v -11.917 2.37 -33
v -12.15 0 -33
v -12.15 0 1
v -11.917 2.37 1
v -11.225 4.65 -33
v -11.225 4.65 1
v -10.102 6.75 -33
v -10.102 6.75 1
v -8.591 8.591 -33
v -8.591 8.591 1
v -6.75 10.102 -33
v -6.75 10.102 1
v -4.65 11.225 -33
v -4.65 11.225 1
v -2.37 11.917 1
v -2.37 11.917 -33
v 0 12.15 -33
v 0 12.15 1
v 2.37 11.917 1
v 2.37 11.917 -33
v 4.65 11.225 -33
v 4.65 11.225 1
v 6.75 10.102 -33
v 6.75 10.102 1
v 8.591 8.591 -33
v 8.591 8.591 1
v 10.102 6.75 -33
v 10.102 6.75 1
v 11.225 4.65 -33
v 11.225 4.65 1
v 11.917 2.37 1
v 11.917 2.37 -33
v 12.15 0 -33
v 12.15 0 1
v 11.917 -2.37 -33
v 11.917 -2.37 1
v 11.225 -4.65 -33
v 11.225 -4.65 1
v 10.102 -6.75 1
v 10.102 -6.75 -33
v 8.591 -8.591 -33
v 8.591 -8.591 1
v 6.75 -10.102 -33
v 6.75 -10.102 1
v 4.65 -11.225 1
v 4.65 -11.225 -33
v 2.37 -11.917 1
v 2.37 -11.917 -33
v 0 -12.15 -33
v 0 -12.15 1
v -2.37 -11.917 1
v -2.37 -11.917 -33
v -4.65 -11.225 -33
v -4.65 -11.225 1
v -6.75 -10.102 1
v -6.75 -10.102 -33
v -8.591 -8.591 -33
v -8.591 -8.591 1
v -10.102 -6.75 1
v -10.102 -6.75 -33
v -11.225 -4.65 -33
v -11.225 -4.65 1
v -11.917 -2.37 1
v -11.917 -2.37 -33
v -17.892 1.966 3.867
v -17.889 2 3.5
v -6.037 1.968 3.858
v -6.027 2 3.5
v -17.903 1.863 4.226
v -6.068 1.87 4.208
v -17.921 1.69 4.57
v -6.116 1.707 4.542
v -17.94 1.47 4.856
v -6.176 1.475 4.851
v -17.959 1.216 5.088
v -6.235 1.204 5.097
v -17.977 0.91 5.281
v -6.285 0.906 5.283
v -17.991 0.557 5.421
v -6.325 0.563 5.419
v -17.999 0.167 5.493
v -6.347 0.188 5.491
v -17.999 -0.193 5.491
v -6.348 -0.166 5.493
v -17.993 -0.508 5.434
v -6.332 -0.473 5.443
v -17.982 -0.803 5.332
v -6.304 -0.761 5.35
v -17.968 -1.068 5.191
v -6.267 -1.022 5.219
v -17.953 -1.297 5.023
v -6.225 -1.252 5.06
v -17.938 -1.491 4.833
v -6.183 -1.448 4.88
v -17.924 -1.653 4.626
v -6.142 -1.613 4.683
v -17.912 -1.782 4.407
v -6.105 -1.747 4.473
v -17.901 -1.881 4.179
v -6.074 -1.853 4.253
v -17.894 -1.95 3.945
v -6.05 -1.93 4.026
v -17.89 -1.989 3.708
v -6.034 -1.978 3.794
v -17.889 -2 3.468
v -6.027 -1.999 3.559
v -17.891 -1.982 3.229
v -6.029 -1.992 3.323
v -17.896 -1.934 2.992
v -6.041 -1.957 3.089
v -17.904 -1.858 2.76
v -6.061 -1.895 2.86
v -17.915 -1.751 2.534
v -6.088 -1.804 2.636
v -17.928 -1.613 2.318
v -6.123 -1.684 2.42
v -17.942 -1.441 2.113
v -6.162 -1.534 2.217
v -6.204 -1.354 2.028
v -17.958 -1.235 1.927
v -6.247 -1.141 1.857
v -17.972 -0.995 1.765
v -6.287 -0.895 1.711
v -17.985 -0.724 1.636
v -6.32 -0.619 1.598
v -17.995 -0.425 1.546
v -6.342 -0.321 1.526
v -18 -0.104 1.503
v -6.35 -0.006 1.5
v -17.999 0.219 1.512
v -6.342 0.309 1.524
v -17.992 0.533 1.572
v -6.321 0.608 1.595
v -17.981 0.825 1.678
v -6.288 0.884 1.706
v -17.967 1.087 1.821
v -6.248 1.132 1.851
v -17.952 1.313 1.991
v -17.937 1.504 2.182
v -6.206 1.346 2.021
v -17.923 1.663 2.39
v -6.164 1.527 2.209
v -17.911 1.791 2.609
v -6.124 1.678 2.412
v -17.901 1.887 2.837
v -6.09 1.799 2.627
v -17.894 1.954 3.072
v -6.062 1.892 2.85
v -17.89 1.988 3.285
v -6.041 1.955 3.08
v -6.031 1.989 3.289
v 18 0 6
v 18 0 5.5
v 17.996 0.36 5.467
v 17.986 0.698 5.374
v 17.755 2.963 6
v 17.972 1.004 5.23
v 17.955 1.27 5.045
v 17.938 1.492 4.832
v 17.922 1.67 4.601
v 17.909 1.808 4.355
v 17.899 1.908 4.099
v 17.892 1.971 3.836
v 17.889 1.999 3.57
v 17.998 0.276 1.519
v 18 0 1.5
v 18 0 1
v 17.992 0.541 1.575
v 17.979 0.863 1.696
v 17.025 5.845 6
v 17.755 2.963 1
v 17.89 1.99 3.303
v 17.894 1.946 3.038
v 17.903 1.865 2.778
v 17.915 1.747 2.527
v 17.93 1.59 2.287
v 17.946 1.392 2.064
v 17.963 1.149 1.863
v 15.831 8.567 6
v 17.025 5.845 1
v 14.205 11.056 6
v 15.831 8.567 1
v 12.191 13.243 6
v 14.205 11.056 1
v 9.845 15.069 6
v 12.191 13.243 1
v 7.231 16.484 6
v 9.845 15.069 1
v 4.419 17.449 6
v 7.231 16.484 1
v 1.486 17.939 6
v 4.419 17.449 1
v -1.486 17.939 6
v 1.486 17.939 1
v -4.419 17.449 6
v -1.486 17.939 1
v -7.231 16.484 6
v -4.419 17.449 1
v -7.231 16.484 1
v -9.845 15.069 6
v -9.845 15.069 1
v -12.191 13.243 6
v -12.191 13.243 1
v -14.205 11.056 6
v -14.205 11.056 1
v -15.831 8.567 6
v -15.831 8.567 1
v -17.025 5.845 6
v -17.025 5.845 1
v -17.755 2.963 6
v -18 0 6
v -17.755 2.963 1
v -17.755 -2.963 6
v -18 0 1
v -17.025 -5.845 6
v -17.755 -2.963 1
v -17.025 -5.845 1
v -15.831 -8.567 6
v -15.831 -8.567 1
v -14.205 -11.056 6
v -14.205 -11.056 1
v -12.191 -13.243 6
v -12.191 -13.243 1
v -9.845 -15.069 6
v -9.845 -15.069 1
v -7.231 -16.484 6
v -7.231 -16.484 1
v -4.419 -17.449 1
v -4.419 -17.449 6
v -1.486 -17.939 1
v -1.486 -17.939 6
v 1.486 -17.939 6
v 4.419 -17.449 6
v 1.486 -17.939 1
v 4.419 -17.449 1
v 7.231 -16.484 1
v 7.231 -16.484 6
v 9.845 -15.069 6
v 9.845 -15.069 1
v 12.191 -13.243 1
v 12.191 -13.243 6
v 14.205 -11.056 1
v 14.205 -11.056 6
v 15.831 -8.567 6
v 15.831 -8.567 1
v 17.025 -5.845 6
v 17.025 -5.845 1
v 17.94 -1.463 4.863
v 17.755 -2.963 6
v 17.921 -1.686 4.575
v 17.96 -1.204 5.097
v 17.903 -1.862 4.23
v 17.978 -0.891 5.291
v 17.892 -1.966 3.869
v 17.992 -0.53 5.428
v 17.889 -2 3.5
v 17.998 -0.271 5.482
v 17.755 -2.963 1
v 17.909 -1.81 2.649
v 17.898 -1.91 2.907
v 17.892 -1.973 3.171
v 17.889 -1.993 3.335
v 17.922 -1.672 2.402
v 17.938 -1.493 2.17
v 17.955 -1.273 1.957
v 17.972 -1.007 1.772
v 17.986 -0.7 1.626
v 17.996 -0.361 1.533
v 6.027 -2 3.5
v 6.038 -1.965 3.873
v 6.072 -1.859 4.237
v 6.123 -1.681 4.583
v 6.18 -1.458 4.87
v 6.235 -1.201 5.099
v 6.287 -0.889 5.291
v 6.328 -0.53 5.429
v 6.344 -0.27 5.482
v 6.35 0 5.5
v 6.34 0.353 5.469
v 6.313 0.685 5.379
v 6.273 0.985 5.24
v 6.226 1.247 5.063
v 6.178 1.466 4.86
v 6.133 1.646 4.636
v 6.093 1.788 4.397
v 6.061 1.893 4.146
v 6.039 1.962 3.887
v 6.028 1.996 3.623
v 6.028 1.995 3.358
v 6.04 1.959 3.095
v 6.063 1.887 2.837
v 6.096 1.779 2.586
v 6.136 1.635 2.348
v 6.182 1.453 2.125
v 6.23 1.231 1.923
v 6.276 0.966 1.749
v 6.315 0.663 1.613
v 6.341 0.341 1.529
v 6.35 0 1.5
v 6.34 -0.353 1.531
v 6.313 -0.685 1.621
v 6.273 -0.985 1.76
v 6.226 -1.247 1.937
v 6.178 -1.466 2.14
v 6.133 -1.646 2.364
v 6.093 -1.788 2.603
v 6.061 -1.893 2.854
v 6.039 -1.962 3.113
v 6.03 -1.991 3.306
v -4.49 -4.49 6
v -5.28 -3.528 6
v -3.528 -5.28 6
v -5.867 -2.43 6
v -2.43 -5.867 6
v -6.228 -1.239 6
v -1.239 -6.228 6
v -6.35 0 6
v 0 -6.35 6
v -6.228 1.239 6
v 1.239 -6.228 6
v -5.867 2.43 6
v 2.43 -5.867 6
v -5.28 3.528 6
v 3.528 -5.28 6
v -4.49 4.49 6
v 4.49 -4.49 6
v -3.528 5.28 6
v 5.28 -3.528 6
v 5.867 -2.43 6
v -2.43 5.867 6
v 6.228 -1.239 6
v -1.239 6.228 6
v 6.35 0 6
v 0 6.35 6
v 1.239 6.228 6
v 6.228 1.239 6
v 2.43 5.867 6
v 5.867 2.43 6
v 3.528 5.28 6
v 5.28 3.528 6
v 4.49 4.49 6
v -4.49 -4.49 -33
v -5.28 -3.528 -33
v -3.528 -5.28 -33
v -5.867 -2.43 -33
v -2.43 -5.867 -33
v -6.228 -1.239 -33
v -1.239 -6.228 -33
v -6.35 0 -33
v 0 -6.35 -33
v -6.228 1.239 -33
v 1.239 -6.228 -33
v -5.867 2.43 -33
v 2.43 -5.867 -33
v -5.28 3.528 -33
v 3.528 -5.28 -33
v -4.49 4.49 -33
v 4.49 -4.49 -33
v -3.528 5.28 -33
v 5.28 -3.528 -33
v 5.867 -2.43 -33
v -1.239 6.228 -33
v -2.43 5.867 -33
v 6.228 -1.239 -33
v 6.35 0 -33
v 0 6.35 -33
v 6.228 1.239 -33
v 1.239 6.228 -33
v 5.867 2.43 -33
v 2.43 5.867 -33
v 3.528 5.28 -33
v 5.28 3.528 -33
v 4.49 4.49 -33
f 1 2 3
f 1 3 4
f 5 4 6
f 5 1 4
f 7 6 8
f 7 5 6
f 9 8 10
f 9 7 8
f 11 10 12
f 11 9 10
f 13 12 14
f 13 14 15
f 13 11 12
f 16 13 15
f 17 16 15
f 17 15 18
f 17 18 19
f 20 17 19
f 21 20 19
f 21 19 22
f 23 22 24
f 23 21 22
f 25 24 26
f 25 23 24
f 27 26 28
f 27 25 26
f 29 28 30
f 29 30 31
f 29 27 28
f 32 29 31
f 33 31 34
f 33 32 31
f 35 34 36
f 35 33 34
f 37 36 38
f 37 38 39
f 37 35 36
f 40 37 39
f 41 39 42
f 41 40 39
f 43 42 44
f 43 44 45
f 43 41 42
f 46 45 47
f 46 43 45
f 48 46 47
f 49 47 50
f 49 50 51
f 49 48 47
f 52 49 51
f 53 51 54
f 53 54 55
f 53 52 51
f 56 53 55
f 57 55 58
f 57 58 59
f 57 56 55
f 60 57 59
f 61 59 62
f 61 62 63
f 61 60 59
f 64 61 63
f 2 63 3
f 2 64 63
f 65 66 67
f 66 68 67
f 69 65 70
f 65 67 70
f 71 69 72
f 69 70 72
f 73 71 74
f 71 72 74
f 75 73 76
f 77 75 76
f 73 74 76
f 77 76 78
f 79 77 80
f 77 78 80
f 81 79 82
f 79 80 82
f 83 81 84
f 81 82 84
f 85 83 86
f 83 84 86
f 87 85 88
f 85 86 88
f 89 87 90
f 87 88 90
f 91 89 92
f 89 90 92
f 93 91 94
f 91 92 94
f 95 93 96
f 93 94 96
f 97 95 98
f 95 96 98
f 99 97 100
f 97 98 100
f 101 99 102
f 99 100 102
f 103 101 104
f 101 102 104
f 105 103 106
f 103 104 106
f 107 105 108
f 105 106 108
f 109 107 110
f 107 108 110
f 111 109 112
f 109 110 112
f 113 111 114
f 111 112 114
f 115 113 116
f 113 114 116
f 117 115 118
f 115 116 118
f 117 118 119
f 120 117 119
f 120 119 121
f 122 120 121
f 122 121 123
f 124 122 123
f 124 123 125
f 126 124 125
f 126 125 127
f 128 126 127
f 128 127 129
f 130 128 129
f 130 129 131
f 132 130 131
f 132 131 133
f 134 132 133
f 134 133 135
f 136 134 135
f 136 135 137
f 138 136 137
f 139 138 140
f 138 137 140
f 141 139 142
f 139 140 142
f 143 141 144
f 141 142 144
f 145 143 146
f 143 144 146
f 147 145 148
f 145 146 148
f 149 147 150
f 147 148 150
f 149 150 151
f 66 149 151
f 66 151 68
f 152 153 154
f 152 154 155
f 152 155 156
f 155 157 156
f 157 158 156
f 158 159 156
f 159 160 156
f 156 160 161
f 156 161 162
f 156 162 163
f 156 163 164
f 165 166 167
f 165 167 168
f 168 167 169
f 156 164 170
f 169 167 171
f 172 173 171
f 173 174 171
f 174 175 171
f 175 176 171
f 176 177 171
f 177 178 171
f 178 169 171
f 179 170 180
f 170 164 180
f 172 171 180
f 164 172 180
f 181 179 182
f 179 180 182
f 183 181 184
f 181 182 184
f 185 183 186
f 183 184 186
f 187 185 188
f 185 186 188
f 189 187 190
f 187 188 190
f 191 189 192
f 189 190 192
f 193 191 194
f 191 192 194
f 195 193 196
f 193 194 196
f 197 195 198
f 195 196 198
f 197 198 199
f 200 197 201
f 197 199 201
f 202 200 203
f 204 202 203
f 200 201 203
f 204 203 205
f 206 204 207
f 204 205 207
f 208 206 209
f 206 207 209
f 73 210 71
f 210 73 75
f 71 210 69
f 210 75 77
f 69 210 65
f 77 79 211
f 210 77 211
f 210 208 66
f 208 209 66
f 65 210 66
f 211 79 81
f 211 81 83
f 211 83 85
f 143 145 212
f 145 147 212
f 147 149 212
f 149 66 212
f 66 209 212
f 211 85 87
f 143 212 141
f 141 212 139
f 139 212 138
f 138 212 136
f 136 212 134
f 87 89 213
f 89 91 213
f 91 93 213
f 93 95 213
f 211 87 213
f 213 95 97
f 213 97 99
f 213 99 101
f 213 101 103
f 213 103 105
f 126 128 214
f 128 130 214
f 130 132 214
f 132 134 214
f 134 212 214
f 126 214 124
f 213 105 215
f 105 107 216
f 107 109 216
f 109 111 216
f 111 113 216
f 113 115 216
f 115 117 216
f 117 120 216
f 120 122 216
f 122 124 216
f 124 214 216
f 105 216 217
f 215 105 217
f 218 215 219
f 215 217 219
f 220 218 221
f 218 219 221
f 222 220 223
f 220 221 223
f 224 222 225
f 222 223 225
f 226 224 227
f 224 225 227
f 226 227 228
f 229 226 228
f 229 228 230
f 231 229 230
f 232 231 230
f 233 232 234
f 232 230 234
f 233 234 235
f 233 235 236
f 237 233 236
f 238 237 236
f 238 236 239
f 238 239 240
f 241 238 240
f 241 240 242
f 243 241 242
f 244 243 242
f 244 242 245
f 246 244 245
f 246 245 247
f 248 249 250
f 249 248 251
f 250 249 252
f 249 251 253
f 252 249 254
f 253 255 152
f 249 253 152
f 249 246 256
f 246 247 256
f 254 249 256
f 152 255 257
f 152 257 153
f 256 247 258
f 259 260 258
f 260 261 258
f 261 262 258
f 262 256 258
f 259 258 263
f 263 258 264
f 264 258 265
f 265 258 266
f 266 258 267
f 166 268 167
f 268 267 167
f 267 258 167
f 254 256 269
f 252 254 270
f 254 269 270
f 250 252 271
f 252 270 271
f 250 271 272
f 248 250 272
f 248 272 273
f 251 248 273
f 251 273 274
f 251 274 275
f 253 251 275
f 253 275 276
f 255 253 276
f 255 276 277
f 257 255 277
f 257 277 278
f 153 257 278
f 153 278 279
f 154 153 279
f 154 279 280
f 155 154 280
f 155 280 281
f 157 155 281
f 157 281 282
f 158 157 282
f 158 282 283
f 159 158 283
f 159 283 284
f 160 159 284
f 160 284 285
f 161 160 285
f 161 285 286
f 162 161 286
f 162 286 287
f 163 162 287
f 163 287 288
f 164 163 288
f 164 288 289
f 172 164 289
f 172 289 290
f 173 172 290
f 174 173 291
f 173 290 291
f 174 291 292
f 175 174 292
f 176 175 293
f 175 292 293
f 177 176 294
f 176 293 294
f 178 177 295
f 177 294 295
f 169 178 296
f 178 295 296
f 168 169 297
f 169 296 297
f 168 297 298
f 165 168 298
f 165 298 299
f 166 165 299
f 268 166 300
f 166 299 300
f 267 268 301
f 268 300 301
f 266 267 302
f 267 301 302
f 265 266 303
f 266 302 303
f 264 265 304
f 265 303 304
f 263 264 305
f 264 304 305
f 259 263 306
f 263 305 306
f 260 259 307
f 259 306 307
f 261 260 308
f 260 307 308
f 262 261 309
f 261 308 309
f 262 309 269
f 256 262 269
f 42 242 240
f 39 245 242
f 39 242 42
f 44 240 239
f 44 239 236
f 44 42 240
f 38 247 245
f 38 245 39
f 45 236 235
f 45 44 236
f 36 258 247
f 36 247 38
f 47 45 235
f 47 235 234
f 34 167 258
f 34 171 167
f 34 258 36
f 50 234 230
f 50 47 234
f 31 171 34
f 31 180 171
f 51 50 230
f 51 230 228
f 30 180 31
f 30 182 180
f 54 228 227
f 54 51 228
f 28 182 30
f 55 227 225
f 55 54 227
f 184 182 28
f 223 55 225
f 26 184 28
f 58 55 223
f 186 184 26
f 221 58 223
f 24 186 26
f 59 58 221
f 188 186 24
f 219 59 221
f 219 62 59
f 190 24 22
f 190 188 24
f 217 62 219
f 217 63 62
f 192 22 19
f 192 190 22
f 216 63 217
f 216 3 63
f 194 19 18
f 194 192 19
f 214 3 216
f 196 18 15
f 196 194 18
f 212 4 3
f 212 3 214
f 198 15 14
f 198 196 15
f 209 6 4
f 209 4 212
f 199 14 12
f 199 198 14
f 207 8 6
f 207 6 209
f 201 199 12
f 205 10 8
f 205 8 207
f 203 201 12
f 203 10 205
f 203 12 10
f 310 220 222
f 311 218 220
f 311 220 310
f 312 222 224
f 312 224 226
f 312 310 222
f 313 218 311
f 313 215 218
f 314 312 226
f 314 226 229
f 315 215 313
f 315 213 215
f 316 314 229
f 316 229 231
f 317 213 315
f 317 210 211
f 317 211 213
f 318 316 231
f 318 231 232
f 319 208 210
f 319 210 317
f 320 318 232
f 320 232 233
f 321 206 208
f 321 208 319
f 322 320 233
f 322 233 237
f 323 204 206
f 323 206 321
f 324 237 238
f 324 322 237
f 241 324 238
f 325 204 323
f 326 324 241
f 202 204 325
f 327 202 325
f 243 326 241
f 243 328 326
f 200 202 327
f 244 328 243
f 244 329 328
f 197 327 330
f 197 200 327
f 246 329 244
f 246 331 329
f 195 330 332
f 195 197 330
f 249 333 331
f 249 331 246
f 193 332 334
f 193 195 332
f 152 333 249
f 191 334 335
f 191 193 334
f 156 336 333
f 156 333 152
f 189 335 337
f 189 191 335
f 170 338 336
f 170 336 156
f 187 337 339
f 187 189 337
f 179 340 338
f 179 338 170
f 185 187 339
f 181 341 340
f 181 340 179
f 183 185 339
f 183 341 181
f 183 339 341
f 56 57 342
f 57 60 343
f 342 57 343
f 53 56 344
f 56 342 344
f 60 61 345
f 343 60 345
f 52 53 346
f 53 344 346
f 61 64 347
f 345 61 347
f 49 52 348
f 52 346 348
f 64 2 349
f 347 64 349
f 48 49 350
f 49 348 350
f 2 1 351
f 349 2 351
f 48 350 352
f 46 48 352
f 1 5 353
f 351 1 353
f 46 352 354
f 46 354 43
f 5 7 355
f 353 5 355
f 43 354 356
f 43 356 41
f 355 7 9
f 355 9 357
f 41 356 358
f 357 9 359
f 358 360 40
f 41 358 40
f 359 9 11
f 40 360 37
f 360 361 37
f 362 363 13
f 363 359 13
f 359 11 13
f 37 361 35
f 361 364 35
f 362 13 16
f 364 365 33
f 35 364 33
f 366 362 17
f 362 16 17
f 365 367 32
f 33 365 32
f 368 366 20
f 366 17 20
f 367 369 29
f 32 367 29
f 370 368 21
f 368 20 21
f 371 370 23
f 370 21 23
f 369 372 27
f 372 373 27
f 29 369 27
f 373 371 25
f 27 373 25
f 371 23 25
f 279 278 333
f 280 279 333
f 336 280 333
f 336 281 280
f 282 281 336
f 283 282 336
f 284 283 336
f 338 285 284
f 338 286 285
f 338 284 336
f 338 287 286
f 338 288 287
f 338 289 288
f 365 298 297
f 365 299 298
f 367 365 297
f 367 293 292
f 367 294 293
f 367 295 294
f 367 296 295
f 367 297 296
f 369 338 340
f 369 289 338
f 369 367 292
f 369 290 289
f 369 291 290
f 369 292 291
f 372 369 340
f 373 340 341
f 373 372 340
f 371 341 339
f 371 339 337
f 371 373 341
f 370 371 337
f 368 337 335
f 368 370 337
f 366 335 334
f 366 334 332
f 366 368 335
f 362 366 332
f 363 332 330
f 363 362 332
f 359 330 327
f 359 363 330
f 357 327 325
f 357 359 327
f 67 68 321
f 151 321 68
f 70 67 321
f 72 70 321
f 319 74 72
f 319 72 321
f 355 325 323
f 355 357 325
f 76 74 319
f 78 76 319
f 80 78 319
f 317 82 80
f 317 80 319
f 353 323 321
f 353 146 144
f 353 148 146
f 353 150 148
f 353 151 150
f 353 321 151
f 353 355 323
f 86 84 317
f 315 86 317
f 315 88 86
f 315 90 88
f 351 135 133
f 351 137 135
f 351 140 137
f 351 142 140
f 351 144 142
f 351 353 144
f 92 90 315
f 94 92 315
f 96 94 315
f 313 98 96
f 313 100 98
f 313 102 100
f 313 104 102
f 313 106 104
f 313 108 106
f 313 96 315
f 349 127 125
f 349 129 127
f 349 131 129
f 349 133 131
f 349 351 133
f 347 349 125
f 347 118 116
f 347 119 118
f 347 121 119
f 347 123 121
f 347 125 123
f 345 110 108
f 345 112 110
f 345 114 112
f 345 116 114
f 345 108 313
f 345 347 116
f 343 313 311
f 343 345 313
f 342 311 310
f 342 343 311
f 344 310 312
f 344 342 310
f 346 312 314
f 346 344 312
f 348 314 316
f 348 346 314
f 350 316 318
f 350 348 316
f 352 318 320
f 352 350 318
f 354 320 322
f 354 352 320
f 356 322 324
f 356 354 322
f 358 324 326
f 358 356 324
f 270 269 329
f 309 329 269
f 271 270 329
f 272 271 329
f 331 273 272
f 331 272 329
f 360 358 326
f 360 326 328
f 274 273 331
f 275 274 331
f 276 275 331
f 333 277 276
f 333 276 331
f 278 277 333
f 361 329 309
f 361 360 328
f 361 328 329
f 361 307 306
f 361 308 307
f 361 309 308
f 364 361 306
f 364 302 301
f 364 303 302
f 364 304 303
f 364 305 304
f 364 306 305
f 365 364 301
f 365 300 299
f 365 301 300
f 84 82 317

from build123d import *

# Parameters (mm, degrees)
BOSS_EXTRUDE1_DEPTH      = 6
BOSS_EXTRUDE1_DEPTH_BACK = 33
SKETCH1_R                = 18
SKETCH1_R_2              = 6.35
CUT_EXTRUDE1_OUTLINE_W   = 2
CUT_EXTRUDE1_OUTLINE_H   = 11.973288181
CIRPATTERN1_COUNT        = 2
SKETCH2_OUTSIDE_W        = 50.826
SKETCH2_OUTSIDE_H        = 50.826
SKETCH2_OUTSIDE_R        = 12.15
CUT_EXTRUDE2_DEPTH       = 34


# Read off the part's stored shape, not the designer's step: Cut-Extrude1
with BuildPart() as part:
    # Sketch1 → Boss-Extrude1 (new, two sides: drawn at the far end of the back side and taken through both)
    with BuildSketch(Plane.XY.offset(-BOSS_EXTRUDE1_DEPTH_BACK)):
        Circle(SKETCH1_R)
        Circle(SKETCH1_R_2, mode=Mode.SUBTRACT)
    extrude(amount=BOSS_EXTRUDE1_DEPTH + BOSS_EXTRUDE1_DEPTH_BACK)

    # Cut-Extrude1 outline → Cut-Extrude1 (revolve, cut)
    with BuildSketch(Plane.YX.offset(-3.5)):
        with Locations((1, -12.013415915)):
            Rectangle(CUT_EXTRUDE1_OUTLINE_W, CUT_EXTRUDE1_OUTLINE_H)
    cut_extrude1 = revolve(axis=Axis((0, 0, 3.5), (1, 0, 0)), mode=Mode.SUBTRACT)

    # CirPattern1: Cut-Extrude1 ×2 about axis
    cirpattern1_axis = Axis((0, 0, 6), (0, 0, 1))
    for i in range(1, CIRPATTERN1_COUNT):
        add(cut_extrude1.rotate(cirpattern1_axis, i * 360 / CIRPATTERN1_COUNT), mode=Mode.SUBTRACT)

    # Sketch2 outside → Cut-Extrude2 (cut)
    with BuildSketch(Plane(origin=(0, 0, -33), x_dir=(-1, 0, 0), z_dir=(0, 0, -1))):
        Rectangle(SKETCH2_OUTSIDE_W, SKETCH2_OUTSIDE_H)
        Circle(SKETCH2_OUTSIDE_R, mode=Mode.SUBTRACT)
    extrude(amount=-CUT_EXTRUDE2_DEPTH, mode=Mode.SUBTRACT)


solid = part.part
